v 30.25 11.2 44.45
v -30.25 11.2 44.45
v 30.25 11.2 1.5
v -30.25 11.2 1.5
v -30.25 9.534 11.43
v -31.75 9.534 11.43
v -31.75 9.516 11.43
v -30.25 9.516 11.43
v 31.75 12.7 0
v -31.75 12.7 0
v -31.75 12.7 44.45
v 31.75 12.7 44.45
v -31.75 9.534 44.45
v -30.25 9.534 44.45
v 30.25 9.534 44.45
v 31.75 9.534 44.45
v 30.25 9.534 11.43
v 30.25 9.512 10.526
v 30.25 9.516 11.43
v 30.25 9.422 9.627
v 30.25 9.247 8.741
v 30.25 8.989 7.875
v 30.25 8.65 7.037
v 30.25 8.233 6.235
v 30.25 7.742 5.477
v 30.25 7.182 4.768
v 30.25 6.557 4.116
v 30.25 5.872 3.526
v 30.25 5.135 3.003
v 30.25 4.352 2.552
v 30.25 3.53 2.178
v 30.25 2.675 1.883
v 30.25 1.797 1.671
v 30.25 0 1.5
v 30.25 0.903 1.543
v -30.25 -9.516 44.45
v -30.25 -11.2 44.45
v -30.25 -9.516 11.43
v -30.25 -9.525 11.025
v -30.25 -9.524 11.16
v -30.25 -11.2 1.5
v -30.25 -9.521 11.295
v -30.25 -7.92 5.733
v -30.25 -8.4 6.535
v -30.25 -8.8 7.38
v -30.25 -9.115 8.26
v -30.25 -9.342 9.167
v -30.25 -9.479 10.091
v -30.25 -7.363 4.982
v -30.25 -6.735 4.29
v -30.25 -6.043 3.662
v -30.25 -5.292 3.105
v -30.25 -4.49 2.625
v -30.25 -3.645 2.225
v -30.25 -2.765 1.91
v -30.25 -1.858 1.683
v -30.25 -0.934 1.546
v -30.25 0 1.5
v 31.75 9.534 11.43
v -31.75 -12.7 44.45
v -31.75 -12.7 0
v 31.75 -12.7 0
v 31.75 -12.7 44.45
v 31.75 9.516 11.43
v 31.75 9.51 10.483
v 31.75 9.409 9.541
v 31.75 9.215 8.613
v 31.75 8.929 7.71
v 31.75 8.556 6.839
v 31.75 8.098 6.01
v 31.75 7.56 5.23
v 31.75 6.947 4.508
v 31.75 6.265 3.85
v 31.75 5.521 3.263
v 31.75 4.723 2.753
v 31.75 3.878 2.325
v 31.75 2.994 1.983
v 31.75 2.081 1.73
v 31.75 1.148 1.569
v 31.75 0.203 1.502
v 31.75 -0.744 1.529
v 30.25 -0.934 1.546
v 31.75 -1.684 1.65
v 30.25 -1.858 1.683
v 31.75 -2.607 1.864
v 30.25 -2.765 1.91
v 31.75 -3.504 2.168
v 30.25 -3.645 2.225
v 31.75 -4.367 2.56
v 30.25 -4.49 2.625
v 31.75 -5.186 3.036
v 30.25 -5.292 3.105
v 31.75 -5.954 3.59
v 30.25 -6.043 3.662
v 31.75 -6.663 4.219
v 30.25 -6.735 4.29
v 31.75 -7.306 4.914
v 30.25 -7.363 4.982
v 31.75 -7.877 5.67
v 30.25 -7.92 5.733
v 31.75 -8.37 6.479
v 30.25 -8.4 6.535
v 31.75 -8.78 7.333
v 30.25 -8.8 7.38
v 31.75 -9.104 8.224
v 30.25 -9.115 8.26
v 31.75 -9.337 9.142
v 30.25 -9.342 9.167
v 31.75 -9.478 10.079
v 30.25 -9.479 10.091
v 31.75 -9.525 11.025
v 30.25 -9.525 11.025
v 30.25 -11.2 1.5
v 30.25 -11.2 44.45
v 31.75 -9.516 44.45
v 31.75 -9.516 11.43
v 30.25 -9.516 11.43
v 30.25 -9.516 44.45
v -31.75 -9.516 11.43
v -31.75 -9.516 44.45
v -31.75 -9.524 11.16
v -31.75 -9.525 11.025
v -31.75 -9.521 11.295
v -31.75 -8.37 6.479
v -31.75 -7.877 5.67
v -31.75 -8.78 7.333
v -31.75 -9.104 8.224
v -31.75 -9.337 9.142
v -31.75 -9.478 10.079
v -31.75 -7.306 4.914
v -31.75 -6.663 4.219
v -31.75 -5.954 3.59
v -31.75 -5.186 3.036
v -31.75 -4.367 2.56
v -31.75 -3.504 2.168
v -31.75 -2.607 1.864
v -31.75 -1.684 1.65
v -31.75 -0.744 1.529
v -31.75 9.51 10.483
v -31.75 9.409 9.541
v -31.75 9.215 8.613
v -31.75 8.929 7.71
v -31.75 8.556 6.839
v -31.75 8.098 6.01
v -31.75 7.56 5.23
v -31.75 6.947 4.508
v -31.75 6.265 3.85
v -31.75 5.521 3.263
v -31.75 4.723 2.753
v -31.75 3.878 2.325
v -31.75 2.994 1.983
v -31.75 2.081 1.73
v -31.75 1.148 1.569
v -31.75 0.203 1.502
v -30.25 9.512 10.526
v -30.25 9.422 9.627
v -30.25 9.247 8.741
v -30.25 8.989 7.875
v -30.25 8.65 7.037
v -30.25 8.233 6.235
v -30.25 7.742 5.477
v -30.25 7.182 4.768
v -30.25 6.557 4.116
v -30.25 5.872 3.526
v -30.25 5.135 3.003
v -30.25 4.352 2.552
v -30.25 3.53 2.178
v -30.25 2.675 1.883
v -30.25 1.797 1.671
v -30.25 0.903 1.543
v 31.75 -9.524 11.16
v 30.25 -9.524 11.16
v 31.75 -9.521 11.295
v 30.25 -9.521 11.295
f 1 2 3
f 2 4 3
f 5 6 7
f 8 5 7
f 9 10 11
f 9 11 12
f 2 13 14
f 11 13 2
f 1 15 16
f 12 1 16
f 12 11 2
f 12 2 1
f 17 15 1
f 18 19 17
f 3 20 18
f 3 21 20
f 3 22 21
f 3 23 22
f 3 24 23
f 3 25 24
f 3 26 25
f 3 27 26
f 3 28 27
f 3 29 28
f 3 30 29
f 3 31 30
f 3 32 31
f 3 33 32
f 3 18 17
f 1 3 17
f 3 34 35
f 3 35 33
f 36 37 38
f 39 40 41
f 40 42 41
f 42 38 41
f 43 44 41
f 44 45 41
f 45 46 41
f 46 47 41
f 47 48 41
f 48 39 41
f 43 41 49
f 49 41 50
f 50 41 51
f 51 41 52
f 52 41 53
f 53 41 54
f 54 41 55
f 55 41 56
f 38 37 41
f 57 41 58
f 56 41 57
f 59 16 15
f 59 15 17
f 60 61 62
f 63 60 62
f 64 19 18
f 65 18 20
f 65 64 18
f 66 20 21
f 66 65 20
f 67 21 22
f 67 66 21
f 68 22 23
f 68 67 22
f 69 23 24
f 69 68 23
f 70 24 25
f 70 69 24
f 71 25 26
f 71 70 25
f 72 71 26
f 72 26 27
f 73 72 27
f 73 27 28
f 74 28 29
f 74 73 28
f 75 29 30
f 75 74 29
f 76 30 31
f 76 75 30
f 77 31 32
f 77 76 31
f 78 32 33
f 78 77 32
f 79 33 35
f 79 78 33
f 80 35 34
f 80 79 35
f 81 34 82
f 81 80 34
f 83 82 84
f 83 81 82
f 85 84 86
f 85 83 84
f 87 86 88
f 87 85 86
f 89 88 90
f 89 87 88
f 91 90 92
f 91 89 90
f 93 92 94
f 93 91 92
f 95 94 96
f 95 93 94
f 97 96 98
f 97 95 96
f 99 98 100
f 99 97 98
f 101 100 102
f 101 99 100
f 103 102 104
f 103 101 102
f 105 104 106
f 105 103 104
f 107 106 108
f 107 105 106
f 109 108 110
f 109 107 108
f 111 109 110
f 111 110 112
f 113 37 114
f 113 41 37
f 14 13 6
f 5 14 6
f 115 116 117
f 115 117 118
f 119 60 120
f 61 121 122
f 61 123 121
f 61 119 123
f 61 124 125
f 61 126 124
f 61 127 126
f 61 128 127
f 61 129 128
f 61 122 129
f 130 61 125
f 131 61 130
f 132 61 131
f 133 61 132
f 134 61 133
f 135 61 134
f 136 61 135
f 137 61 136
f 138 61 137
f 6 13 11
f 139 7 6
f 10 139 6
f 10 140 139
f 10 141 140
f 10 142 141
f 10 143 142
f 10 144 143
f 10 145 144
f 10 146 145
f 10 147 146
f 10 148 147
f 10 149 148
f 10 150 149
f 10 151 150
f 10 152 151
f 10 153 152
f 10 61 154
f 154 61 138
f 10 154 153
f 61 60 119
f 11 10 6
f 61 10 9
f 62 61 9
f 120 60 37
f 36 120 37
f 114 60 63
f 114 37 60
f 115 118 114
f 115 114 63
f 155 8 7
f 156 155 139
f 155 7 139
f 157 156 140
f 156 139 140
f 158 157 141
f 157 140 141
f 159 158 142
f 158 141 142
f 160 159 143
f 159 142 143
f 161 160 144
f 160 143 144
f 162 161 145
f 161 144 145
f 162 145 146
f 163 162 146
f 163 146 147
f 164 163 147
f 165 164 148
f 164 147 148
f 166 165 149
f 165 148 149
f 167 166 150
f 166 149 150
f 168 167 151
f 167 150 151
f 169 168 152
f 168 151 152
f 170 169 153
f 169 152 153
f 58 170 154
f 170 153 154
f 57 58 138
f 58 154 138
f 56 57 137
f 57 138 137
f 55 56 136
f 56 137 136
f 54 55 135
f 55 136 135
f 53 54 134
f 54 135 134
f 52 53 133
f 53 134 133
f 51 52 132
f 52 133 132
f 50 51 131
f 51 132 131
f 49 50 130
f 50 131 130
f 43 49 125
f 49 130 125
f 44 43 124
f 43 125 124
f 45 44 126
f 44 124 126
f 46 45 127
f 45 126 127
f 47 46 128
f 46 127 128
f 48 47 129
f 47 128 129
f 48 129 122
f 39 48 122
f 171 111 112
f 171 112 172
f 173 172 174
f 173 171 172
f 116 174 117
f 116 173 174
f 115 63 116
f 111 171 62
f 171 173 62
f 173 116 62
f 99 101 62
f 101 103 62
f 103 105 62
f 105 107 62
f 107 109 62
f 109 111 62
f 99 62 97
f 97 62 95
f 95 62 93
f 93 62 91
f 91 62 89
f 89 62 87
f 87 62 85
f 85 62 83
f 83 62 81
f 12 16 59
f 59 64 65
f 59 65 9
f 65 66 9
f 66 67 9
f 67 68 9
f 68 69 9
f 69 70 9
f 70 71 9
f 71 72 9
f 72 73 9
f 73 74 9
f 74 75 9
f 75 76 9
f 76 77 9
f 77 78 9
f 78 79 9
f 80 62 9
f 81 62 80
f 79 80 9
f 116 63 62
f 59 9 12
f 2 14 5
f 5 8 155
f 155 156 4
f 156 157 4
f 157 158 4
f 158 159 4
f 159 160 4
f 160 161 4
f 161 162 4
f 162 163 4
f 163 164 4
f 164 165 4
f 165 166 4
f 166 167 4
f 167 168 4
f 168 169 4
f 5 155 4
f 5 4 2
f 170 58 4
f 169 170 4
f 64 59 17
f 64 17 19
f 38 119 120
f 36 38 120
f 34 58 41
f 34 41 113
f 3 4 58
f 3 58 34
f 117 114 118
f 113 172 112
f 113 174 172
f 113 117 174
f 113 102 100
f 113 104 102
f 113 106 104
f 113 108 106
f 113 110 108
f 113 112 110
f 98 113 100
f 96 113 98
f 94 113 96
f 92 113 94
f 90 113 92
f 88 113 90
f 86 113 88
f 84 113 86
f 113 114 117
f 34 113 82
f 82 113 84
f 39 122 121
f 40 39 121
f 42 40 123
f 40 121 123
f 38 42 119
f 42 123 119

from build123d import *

# Parameters (mm, degrees)
F0_W     = 63.5
F0_H     = 25.4
F1_DEPTH = 44.45
F2_T     = -1.5
F4_DEPTH = 1.5


# Not quite as in the source:
# - a pattern or mirror of a feature is missing from the dataset's text; its kind, count and spacing are read off the source's solid


with BuildPart() as f1:
    # F0 (on Top) → F1 (new body)
    with BuildSketch(Plane.XY):
        Rectangle(F0_W, F0_H)
    extrude(amount=F1_DEPTH)

    # F2
    f2_openings = [f1.faces().sort_by_distance(p)[0] for p in [
        (0, 0, 44.45),
    ]]
    offset(amount=F2_T, openings=f2_openings)

    # F3 (on face) → F4 (cut)
    with BuildSketch(Plane(origin=(-31.75, 0, 0), x_dir=(0, -1, 0), z_dir=(-1, 0, 0))):
        with BuildLine():
            Line((-9.5163858686, 11.43), (9.5163858686, 11.43))
            ThreePointArc((9.5163858686, 11.43), (0, 20.55), (-9.5163858686, 11.43))
        make_face()
        with BuildLine():
            ThreePointArc((-9.5163858686, 11.43), (-0.2025457993, 1.5021537764), (9.525, 11.025))
            ThreePointArc((9.525, 11.025), (9.5228462236, 11.2275457993), (9.5163858686, 11.43))
            Line((9.5163858686, 11.43), (-9.5163858686, 11.43))
        make_face()
        with BuildLine():
            ThreePointArc((-9.5163858686, 11.43), (0, 20.55), (9.5163858686, 11.43))
            Line((9.5163858686, 11.43), (9.5163858686, 44.45))
            Line((9.5163858686, 44.45), (-9.5336141314, 44.45))
            Line((-9.5336141314, 44.45), (-9.5336141314, 11.43))
            Line((-9.5336141314, 11.43), (-9.5163858686, 11.43))
        make_face()
    f4 = extrude(amount=-F4_DEPTH, mode=Mode.SUBTRACT)

    # F4_copies: F4 across plane
    add(f4.mirror(Plane(origin=(0, 0, 0), x_dir=(0, 0, 1), z_dir=(1, 0, 0))), mode=Mode.SUBTRACT)


solid = f1.part
